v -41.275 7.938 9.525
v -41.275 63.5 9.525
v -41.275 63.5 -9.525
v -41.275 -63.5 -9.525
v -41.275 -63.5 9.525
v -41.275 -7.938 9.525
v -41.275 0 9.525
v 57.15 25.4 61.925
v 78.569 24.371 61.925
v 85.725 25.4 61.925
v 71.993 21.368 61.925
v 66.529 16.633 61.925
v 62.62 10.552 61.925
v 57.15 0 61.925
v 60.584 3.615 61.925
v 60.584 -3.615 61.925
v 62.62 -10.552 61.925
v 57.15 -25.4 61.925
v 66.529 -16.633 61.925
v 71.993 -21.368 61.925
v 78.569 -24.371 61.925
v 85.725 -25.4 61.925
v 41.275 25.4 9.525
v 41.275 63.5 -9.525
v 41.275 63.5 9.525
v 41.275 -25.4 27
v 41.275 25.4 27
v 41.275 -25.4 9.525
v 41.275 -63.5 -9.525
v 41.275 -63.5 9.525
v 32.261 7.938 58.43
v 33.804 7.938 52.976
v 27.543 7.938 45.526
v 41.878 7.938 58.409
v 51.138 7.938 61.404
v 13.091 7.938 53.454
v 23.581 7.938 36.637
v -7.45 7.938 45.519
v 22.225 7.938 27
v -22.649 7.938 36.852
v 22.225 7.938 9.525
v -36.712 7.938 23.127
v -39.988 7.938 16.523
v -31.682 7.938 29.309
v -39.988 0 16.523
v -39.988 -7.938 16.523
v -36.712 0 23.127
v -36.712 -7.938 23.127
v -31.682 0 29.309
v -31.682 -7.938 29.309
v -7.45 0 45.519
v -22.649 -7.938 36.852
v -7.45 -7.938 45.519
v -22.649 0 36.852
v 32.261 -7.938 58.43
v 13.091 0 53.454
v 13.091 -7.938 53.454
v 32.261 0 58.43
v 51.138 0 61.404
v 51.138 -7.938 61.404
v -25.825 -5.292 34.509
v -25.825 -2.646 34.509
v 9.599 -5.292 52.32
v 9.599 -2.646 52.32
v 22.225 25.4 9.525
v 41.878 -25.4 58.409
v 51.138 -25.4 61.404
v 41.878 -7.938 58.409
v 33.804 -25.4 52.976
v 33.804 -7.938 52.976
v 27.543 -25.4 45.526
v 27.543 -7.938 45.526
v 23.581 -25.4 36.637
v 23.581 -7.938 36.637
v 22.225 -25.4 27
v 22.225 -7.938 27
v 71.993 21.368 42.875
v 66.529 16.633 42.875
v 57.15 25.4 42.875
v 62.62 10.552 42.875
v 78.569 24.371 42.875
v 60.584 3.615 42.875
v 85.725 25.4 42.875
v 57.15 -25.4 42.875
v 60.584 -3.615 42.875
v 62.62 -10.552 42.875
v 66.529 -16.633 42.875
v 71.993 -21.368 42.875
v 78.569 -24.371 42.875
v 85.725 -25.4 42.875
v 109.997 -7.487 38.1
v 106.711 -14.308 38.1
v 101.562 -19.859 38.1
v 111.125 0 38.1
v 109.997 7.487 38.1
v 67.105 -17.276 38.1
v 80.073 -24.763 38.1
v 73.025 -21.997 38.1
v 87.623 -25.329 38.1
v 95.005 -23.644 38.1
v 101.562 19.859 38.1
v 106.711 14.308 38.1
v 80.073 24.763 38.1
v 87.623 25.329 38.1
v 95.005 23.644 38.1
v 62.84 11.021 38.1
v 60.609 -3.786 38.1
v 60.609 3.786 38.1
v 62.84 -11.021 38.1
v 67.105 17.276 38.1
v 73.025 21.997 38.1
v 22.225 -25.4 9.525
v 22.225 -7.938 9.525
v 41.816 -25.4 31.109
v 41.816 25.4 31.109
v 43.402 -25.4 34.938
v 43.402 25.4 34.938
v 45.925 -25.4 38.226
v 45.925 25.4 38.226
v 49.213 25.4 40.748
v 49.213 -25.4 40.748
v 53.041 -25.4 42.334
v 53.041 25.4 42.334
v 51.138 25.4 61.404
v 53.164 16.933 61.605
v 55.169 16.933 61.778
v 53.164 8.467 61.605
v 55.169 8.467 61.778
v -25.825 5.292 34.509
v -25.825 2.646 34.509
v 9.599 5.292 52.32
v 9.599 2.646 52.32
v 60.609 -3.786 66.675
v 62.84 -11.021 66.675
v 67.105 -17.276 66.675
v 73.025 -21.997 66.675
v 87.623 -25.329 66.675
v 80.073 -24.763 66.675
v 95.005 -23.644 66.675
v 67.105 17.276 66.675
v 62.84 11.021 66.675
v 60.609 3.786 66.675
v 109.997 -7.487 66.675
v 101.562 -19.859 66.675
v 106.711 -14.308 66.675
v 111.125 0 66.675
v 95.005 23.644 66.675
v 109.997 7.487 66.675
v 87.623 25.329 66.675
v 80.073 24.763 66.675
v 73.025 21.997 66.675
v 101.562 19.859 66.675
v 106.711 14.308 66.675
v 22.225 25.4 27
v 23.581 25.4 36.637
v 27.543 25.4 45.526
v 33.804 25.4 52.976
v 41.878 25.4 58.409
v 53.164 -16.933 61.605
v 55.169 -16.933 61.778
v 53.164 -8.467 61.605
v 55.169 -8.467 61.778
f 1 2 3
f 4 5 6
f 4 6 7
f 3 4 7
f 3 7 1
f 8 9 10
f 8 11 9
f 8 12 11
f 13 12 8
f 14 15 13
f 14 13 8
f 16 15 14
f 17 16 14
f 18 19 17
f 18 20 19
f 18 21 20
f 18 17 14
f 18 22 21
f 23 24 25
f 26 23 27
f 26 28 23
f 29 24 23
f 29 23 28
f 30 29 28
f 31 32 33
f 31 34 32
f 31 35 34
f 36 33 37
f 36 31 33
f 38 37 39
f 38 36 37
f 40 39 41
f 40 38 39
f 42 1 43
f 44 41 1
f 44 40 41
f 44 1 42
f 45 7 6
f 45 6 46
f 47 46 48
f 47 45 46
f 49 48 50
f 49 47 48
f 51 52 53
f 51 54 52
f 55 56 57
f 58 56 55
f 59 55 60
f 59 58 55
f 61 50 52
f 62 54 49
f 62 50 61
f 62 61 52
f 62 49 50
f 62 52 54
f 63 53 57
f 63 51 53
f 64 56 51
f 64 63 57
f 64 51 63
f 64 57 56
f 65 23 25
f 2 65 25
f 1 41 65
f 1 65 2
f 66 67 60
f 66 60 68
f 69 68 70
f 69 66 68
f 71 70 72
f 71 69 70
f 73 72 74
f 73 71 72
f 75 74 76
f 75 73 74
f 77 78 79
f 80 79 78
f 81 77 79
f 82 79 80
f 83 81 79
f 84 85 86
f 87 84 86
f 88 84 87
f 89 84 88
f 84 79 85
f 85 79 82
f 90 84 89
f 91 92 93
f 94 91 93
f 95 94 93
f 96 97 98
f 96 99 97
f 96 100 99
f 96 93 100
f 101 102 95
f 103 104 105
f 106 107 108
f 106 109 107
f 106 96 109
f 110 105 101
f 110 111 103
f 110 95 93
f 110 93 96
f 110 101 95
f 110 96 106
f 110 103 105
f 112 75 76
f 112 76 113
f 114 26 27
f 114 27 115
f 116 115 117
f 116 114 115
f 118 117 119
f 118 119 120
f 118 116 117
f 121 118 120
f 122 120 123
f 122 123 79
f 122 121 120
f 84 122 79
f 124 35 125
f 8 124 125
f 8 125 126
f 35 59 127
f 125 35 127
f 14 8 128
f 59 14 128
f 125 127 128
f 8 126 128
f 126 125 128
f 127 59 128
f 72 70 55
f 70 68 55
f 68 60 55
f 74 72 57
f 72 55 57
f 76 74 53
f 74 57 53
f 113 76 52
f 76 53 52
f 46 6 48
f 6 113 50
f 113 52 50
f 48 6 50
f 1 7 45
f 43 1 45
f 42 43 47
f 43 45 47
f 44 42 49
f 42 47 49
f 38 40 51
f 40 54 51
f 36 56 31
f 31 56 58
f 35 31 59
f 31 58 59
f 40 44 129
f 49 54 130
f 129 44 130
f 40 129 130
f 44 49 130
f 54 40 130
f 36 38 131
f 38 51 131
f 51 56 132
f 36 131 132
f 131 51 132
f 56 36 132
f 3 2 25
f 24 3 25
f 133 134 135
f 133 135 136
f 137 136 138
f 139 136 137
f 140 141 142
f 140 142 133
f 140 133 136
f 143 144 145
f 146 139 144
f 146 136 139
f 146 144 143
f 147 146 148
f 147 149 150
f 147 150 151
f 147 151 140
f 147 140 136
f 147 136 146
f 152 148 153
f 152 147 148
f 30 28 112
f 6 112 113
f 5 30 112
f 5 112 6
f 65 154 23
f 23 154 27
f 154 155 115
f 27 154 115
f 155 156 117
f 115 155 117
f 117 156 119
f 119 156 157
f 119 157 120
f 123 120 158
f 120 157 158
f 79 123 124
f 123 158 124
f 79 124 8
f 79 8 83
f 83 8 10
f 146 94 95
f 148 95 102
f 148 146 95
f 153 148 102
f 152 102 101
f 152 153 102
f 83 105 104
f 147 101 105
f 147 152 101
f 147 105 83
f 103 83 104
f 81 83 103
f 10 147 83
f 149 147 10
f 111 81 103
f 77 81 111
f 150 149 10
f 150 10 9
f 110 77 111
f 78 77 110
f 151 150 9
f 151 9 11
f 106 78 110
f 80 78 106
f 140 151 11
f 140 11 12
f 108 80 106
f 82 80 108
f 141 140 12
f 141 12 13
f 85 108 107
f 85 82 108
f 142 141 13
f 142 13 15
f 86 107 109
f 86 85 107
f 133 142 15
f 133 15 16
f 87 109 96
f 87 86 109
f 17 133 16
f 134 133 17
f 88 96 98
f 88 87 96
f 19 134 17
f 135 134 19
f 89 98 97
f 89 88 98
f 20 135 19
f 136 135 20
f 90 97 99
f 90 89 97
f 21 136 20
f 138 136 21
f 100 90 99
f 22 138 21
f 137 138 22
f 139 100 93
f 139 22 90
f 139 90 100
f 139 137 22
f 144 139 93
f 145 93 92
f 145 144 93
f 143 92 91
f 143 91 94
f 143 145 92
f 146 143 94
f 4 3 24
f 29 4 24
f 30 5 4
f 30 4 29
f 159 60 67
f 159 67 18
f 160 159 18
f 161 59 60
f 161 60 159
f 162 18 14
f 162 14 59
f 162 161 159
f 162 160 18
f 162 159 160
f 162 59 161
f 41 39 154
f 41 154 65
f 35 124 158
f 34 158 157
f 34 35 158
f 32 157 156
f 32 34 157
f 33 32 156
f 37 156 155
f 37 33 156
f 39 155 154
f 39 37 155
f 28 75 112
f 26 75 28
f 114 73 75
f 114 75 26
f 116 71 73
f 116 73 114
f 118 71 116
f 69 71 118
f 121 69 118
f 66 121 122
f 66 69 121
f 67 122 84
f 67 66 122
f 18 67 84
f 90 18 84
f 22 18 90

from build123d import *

# Parameters (mm, degrees)
F1_DEPTH = 63.5
F0_W     = 25.4
F0_H     = 19.05
F2_DEPTH = 25.4
F3_DEPTH = 7.9375


with BuildPart() as f1:
    # F0 (on Front) → F1 (new body, symmetric)
    with BuildSketch(Plane.XZ):
        Polygon((22.225, 9.525), (-41.275, 9.525), (-41.275, -9.525), (41.275, -9.525), (41.275, 9.525), align=None)
    extrude(amount=F1_DEPTH, both=True)

    # F0 (on Front) → F2 (join, symmetric)
    with BuildSketch(Plane.XZ):
        with BuildLine():
            Line((22.225, 27.0002), (22.225, 9.525))
            Line((22.225, 9.525), (41.275, 9.525))
            Line((41.275, 9.525), (41.275, 27.0002))
            ThreePointArc((41.275, 27.0002), (45.9246798487, 38.2255201513), (57.15, 42.8752))
            Line((57.15, 42.8752), (60.325, 42.8752))
            Line((60.325, 42.8752), (60.325, 61.9252))
            Line((60.325, 61.9252), (57.15, 61.9252))
            add(Edge.make_bspline(
                [(51.1376503086, 61.4037939429), (53.174688835, 61.6179457119), (55.1815563456, 61.7920560341), (57.15, 61.9252)],
                knots=[106.0980519126, 106.0980519126, 106.0980519126, 106.0980519126, 111.5045361635, 111.5045361635, 111.5045361635, 111.5045361635], degree=3))
            ThreePointArc((51.1376503086, 61.4037939429), (30.4129756894, 49.4698941682), (22.225, 27.0002))
        make_face()
        with Locations((73.025, 52.4002)):
            Rectangle(F0_W, F0_H)
    extrude(amount=F2_DEPTH, both=True)

    # F0 (on Front) → F3 (join, symmetric)
    with BuildSketch(Plane.XZ):
        with BuildLine():
            add(Edge.make_bspline(
                [(-41.275, 9.525), (-40.4321093733, 37.5783033458), (11.1623522611, 57.2012318992), (51.1376503086, 61.4037939429)],
                knots=[0, 0, 0, 0, 106.0980519126, 106.0980519126, 106.0980519126, 106.0980519126], degree=3))
            Line((-41.275, 9.525), (22.225, 9.525))
            Line((22.225, 9.525), (22.225, 27.0002))
            ThreePointArc((22.225, 27.0002), (30.4129756894, 49.4698941682), (51.1376503086, 61.4037939429))
        make_face()
    extrude(amount=F3_DEPTH, both=True)

    # F0 (on Front) → F4 (revolve)
    with BuildSketch(Plane.XZ):
        Polygon((85.725, 66.675), (85.725, 61.9252), (85.725, 42.8752), (85.725, 38.1), (111.125, 38.1), (111.125, 66.675), align=None)
    revolve(axis=Axis((85.725, 0, 54.7751), (0, 0, 1)))


solid = f1.part
